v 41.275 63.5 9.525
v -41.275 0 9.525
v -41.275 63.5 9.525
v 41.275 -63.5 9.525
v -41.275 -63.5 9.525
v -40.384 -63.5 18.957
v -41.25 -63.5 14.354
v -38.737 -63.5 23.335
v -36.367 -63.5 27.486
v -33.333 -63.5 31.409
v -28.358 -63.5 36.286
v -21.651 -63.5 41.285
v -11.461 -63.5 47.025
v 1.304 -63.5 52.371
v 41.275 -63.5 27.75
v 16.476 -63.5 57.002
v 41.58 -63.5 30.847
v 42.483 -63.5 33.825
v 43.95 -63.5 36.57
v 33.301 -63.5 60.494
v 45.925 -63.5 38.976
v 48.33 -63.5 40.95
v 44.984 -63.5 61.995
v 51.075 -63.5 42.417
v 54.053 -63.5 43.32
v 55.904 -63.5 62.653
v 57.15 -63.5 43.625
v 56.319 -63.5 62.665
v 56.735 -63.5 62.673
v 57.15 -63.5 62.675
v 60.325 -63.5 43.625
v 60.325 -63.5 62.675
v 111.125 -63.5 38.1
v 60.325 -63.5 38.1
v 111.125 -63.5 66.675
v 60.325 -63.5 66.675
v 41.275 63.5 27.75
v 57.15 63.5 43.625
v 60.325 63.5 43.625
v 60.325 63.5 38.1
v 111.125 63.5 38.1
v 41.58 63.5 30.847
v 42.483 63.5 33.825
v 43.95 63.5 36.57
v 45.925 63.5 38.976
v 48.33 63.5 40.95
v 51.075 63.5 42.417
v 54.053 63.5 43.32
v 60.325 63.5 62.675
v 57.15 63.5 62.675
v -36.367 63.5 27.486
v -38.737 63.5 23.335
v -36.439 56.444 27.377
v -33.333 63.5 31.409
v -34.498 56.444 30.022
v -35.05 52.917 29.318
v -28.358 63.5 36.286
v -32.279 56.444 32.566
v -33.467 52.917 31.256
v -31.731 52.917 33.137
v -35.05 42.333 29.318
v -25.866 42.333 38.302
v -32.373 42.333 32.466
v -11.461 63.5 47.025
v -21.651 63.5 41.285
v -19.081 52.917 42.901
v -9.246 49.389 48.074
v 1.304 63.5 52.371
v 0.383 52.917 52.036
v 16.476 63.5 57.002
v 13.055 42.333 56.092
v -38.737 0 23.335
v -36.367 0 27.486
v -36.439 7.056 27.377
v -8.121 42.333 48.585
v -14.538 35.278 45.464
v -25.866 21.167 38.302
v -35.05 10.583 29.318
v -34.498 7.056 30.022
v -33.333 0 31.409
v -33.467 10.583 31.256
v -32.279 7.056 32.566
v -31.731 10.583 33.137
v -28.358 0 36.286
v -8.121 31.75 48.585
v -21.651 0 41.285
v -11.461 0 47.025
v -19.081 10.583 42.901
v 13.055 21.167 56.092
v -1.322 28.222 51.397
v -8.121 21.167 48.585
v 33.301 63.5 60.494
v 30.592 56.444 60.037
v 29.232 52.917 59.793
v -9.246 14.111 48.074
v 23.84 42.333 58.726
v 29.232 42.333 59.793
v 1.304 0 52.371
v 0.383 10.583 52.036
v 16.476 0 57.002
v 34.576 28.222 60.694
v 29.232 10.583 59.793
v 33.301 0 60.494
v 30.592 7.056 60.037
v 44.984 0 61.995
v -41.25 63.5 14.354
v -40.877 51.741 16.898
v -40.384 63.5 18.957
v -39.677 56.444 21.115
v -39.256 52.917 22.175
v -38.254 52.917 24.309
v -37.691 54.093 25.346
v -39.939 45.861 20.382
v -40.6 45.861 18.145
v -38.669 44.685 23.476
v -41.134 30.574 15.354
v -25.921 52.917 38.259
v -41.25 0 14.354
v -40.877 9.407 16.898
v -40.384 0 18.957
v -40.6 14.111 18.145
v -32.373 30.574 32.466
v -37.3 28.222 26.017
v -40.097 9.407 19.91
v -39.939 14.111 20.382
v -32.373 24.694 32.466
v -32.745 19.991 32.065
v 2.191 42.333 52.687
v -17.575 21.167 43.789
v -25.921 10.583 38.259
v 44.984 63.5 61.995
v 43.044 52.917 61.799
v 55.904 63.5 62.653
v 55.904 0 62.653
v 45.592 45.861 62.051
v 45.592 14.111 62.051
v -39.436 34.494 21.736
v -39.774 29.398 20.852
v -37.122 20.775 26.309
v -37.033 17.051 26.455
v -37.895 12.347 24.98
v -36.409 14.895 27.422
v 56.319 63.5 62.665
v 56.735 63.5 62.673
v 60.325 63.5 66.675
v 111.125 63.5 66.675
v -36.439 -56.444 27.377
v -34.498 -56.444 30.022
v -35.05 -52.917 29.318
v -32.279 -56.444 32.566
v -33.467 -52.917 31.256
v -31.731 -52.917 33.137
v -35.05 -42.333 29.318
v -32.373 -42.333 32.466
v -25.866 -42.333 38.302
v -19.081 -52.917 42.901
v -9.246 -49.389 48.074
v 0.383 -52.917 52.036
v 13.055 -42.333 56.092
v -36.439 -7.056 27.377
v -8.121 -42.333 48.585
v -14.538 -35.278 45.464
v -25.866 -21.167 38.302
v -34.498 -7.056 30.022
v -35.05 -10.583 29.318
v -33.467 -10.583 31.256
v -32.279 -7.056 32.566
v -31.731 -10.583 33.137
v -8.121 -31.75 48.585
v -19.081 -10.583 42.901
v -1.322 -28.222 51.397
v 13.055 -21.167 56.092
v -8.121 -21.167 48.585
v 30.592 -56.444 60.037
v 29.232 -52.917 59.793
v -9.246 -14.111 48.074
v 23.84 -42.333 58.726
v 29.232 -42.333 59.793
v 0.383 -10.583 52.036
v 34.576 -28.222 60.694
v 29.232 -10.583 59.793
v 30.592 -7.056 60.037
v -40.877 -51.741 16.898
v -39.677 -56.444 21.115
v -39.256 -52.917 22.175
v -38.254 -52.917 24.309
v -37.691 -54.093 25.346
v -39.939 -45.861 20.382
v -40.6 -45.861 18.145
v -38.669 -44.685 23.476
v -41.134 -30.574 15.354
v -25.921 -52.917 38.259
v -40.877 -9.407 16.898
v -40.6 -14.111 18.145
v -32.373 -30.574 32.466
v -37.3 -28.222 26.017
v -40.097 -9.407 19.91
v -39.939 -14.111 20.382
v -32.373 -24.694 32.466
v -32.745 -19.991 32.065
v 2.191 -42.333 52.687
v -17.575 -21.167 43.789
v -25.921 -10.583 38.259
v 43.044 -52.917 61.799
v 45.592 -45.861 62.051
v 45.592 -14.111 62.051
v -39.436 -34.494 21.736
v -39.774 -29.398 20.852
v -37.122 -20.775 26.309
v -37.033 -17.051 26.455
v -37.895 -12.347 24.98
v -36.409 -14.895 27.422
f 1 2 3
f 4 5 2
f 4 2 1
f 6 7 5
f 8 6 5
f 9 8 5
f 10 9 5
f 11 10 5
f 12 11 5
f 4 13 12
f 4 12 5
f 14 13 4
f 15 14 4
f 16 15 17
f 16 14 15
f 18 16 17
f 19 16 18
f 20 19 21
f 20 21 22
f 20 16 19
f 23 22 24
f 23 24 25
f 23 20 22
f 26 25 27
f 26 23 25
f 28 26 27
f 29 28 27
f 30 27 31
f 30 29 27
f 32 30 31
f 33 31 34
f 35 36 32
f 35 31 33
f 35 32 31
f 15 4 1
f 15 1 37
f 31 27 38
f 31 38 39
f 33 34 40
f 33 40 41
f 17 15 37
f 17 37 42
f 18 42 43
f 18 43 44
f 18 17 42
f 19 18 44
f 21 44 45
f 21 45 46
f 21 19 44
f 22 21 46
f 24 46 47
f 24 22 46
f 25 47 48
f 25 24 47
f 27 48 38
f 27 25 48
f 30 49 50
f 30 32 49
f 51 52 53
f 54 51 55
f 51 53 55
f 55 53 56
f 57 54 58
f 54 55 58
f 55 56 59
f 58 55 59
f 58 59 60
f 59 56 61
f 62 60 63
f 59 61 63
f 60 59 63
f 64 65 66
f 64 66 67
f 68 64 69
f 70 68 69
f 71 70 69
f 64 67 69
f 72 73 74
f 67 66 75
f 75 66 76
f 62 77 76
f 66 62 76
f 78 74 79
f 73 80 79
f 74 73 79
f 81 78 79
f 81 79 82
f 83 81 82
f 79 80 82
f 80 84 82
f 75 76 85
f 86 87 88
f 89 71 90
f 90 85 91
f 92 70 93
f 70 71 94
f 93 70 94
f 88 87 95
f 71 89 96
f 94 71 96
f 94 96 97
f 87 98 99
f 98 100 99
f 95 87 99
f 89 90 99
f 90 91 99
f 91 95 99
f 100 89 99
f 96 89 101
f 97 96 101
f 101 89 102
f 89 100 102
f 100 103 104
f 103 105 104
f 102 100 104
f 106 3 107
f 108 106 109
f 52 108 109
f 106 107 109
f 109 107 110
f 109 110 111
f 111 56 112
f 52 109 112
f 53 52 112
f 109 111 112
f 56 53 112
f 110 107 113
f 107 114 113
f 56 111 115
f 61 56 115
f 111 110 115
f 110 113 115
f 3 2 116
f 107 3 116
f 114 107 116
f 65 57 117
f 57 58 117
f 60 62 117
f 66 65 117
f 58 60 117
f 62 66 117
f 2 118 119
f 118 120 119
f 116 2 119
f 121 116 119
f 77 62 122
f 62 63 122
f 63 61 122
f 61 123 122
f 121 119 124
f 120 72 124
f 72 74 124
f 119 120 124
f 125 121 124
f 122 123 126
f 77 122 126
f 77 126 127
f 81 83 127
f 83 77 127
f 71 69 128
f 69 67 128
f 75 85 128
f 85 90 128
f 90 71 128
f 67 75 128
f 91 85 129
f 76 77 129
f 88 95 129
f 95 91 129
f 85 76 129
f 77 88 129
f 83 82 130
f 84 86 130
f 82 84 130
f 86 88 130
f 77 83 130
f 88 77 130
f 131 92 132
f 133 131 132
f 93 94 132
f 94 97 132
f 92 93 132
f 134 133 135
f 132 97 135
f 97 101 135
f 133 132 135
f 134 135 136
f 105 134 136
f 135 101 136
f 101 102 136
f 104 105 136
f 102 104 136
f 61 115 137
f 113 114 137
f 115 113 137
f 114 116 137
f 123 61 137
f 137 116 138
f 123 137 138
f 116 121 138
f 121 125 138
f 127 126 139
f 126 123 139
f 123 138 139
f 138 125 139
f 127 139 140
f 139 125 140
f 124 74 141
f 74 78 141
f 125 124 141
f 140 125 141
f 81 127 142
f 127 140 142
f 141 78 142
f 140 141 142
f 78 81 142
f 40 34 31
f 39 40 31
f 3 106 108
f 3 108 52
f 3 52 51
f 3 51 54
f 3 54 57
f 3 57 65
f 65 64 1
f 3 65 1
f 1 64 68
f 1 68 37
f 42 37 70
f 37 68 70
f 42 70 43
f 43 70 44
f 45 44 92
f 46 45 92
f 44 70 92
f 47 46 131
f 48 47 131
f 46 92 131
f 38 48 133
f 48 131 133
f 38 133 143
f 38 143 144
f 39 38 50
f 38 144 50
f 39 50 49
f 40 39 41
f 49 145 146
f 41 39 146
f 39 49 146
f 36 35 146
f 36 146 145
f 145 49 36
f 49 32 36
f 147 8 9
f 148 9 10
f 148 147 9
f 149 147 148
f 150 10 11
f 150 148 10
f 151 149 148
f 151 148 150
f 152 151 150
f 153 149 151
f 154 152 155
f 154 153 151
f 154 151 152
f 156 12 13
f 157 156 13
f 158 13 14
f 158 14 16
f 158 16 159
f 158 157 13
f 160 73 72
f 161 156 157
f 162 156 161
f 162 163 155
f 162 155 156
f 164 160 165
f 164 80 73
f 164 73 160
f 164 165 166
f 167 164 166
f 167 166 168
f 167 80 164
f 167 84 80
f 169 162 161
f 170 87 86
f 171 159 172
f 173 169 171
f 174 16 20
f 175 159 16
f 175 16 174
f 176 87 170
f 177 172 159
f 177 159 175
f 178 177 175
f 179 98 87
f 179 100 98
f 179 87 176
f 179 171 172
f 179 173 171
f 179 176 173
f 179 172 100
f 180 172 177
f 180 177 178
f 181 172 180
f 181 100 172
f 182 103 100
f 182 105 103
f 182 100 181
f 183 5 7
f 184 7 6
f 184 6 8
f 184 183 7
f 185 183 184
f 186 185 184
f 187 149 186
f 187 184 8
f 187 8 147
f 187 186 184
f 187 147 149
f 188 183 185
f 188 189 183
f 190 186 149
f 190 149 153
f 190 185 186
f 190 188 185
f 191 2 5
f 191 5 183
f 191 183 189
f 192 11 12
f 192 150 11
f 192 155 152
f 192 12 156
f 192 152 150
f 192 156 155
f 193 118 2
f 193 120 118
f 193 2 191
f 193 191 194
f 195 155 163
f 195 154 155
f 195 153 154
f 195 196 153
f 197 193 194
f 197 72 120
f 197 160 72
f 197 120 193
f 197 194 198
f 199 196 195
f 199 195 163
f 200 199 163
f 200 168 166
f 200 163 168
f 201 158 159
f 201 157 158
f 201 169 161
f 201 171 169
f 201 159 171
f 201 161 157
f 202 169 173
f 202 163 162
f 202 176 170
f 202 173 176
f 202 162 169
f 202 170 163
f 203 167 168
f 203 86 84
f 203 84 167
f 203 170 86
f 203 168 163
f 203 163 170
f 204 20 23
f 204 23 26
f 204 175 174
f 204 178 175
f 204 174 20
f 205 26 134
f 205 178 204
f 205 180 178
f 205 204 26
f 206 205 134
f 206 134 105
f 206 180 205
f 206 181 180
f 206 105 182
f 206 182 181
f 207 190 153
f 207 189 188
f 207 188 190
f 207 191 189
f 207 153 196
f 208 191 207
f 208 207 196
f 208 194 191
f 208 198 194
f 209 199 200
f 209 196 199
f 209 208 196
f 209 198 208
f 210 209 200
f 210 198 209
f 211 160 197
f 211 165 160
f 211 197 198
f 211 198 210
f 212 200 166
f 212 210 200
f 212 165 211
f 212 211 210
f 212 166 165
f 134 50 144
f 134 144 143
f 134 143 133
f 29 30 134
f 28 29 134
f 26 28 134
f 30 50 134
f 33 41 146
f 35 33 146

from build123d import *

# Parameters (mm, degrees)
F0_W     = 25.4
F0_H     = 5.5252907636
F0_H_2   = 3.9997092364
F0_H_3   = 19.05
F1_DEPTH = 63.5


with BuildPart() as f1:
    # F0 (on Front) → F1 (new body, symmetric)
    with BuildSketch(Plane.XZ):
        with BuildLine():
            ThreePointArc((57.15, 62.6752907636), (56.5270735546, 62.6697350267), (55.9043452947, 62.6530695835))
            add(Edge.make_bspline(
                [(55.9043452947, 62.6530695835), (56.3224009601, 62.6625285107), (56.7376574323, 62.6699360436), (57.15, 62.6752907636)],
                knots=[110.6508010744, 110.6508010744, 110.6508010744, 110.6508010744, 111.8589917407, 111.8589917407, 111.8589917407, 111.8589917407], degree=3))
        make_face()
        with BuildLine():
            add(Edge.make_bspline(
                [(-41.275, 9.525), (-44.1485205161, 43.7142056375), (17.617181224, 61.7867842379), (55.9043452947, 62.6530695835)],
                knots=[0, 0, 0, 0, 110.6508010744, 110.6508010744, 110.6508010744, 110.6508010744], degree=3))
            Line((-41.275, 9.525), (22.225, 9.525))
            Line((22.225, 9.525), (22.225, 27.7502907636))
            ThreePointArc((22.225, 27.7502907636), (32.0177486525, 52.0015910835), (55.9043452947, 62.6530695835))
        make_face()
        with Locations((73.025, 40.8626453818)):
            Rectangle(F0_W, F0_H)
        with Locations((73.025, 64.6751453818)):
            Rectangle(F0_W, F0_H_2)
        Polygon((85.725, 66.675), (85.725, 62.6752907636), (85.725, 43.6252907636), (85.725, 38.1), (111.125, 38.1), (111.125, 66.675), align=None)
        with BuildLine():
            Line((22.225, 27.7502907636), (22.225, 9.525))
            Line((22.225, 9.525), (41.275, 9.525))
            Line((41.275, 9.525), (41.275, 27.7502907636))
            ThreePointArc((41.275, 27.7502907636), (45.9246798487, 38.9756109149), (57.15, 43.6252907636))
            Line((57.15, 43.6252907636), (60.325, 43.6252907636))
            Line((60.325, 43.6252907636), (60.325, 62.6752907636))
            Line((60.325, 62.6752907636), (57.15, 62.6752907636))
            add(Edge.make_bspline(
                [(55.9043452947, 62.6530695835), (56.3224009601, 62.6625285107), (56.7376574323, 62.6699360436), (57.15, 62.6752907636)],
                knots=[110.6508010744, 110.6508010744, 110.6508010744, 110.6508010744, 111.8589917407, 111.8589917407, 111.8589917407, 111.8589917407], degree=3))
            ThreePointArc((55.9043452947, 62.6530695835), (32.0177486525, 52.0015910835), (22.225, 27.7502907636))
        make_face()
        with Locations((73.025, 53.1502907636)):
            Rectangle(F0_W, F0_H_3)
    extrude(amount=F1_DEPTH, both=True)


solid = f1.part
